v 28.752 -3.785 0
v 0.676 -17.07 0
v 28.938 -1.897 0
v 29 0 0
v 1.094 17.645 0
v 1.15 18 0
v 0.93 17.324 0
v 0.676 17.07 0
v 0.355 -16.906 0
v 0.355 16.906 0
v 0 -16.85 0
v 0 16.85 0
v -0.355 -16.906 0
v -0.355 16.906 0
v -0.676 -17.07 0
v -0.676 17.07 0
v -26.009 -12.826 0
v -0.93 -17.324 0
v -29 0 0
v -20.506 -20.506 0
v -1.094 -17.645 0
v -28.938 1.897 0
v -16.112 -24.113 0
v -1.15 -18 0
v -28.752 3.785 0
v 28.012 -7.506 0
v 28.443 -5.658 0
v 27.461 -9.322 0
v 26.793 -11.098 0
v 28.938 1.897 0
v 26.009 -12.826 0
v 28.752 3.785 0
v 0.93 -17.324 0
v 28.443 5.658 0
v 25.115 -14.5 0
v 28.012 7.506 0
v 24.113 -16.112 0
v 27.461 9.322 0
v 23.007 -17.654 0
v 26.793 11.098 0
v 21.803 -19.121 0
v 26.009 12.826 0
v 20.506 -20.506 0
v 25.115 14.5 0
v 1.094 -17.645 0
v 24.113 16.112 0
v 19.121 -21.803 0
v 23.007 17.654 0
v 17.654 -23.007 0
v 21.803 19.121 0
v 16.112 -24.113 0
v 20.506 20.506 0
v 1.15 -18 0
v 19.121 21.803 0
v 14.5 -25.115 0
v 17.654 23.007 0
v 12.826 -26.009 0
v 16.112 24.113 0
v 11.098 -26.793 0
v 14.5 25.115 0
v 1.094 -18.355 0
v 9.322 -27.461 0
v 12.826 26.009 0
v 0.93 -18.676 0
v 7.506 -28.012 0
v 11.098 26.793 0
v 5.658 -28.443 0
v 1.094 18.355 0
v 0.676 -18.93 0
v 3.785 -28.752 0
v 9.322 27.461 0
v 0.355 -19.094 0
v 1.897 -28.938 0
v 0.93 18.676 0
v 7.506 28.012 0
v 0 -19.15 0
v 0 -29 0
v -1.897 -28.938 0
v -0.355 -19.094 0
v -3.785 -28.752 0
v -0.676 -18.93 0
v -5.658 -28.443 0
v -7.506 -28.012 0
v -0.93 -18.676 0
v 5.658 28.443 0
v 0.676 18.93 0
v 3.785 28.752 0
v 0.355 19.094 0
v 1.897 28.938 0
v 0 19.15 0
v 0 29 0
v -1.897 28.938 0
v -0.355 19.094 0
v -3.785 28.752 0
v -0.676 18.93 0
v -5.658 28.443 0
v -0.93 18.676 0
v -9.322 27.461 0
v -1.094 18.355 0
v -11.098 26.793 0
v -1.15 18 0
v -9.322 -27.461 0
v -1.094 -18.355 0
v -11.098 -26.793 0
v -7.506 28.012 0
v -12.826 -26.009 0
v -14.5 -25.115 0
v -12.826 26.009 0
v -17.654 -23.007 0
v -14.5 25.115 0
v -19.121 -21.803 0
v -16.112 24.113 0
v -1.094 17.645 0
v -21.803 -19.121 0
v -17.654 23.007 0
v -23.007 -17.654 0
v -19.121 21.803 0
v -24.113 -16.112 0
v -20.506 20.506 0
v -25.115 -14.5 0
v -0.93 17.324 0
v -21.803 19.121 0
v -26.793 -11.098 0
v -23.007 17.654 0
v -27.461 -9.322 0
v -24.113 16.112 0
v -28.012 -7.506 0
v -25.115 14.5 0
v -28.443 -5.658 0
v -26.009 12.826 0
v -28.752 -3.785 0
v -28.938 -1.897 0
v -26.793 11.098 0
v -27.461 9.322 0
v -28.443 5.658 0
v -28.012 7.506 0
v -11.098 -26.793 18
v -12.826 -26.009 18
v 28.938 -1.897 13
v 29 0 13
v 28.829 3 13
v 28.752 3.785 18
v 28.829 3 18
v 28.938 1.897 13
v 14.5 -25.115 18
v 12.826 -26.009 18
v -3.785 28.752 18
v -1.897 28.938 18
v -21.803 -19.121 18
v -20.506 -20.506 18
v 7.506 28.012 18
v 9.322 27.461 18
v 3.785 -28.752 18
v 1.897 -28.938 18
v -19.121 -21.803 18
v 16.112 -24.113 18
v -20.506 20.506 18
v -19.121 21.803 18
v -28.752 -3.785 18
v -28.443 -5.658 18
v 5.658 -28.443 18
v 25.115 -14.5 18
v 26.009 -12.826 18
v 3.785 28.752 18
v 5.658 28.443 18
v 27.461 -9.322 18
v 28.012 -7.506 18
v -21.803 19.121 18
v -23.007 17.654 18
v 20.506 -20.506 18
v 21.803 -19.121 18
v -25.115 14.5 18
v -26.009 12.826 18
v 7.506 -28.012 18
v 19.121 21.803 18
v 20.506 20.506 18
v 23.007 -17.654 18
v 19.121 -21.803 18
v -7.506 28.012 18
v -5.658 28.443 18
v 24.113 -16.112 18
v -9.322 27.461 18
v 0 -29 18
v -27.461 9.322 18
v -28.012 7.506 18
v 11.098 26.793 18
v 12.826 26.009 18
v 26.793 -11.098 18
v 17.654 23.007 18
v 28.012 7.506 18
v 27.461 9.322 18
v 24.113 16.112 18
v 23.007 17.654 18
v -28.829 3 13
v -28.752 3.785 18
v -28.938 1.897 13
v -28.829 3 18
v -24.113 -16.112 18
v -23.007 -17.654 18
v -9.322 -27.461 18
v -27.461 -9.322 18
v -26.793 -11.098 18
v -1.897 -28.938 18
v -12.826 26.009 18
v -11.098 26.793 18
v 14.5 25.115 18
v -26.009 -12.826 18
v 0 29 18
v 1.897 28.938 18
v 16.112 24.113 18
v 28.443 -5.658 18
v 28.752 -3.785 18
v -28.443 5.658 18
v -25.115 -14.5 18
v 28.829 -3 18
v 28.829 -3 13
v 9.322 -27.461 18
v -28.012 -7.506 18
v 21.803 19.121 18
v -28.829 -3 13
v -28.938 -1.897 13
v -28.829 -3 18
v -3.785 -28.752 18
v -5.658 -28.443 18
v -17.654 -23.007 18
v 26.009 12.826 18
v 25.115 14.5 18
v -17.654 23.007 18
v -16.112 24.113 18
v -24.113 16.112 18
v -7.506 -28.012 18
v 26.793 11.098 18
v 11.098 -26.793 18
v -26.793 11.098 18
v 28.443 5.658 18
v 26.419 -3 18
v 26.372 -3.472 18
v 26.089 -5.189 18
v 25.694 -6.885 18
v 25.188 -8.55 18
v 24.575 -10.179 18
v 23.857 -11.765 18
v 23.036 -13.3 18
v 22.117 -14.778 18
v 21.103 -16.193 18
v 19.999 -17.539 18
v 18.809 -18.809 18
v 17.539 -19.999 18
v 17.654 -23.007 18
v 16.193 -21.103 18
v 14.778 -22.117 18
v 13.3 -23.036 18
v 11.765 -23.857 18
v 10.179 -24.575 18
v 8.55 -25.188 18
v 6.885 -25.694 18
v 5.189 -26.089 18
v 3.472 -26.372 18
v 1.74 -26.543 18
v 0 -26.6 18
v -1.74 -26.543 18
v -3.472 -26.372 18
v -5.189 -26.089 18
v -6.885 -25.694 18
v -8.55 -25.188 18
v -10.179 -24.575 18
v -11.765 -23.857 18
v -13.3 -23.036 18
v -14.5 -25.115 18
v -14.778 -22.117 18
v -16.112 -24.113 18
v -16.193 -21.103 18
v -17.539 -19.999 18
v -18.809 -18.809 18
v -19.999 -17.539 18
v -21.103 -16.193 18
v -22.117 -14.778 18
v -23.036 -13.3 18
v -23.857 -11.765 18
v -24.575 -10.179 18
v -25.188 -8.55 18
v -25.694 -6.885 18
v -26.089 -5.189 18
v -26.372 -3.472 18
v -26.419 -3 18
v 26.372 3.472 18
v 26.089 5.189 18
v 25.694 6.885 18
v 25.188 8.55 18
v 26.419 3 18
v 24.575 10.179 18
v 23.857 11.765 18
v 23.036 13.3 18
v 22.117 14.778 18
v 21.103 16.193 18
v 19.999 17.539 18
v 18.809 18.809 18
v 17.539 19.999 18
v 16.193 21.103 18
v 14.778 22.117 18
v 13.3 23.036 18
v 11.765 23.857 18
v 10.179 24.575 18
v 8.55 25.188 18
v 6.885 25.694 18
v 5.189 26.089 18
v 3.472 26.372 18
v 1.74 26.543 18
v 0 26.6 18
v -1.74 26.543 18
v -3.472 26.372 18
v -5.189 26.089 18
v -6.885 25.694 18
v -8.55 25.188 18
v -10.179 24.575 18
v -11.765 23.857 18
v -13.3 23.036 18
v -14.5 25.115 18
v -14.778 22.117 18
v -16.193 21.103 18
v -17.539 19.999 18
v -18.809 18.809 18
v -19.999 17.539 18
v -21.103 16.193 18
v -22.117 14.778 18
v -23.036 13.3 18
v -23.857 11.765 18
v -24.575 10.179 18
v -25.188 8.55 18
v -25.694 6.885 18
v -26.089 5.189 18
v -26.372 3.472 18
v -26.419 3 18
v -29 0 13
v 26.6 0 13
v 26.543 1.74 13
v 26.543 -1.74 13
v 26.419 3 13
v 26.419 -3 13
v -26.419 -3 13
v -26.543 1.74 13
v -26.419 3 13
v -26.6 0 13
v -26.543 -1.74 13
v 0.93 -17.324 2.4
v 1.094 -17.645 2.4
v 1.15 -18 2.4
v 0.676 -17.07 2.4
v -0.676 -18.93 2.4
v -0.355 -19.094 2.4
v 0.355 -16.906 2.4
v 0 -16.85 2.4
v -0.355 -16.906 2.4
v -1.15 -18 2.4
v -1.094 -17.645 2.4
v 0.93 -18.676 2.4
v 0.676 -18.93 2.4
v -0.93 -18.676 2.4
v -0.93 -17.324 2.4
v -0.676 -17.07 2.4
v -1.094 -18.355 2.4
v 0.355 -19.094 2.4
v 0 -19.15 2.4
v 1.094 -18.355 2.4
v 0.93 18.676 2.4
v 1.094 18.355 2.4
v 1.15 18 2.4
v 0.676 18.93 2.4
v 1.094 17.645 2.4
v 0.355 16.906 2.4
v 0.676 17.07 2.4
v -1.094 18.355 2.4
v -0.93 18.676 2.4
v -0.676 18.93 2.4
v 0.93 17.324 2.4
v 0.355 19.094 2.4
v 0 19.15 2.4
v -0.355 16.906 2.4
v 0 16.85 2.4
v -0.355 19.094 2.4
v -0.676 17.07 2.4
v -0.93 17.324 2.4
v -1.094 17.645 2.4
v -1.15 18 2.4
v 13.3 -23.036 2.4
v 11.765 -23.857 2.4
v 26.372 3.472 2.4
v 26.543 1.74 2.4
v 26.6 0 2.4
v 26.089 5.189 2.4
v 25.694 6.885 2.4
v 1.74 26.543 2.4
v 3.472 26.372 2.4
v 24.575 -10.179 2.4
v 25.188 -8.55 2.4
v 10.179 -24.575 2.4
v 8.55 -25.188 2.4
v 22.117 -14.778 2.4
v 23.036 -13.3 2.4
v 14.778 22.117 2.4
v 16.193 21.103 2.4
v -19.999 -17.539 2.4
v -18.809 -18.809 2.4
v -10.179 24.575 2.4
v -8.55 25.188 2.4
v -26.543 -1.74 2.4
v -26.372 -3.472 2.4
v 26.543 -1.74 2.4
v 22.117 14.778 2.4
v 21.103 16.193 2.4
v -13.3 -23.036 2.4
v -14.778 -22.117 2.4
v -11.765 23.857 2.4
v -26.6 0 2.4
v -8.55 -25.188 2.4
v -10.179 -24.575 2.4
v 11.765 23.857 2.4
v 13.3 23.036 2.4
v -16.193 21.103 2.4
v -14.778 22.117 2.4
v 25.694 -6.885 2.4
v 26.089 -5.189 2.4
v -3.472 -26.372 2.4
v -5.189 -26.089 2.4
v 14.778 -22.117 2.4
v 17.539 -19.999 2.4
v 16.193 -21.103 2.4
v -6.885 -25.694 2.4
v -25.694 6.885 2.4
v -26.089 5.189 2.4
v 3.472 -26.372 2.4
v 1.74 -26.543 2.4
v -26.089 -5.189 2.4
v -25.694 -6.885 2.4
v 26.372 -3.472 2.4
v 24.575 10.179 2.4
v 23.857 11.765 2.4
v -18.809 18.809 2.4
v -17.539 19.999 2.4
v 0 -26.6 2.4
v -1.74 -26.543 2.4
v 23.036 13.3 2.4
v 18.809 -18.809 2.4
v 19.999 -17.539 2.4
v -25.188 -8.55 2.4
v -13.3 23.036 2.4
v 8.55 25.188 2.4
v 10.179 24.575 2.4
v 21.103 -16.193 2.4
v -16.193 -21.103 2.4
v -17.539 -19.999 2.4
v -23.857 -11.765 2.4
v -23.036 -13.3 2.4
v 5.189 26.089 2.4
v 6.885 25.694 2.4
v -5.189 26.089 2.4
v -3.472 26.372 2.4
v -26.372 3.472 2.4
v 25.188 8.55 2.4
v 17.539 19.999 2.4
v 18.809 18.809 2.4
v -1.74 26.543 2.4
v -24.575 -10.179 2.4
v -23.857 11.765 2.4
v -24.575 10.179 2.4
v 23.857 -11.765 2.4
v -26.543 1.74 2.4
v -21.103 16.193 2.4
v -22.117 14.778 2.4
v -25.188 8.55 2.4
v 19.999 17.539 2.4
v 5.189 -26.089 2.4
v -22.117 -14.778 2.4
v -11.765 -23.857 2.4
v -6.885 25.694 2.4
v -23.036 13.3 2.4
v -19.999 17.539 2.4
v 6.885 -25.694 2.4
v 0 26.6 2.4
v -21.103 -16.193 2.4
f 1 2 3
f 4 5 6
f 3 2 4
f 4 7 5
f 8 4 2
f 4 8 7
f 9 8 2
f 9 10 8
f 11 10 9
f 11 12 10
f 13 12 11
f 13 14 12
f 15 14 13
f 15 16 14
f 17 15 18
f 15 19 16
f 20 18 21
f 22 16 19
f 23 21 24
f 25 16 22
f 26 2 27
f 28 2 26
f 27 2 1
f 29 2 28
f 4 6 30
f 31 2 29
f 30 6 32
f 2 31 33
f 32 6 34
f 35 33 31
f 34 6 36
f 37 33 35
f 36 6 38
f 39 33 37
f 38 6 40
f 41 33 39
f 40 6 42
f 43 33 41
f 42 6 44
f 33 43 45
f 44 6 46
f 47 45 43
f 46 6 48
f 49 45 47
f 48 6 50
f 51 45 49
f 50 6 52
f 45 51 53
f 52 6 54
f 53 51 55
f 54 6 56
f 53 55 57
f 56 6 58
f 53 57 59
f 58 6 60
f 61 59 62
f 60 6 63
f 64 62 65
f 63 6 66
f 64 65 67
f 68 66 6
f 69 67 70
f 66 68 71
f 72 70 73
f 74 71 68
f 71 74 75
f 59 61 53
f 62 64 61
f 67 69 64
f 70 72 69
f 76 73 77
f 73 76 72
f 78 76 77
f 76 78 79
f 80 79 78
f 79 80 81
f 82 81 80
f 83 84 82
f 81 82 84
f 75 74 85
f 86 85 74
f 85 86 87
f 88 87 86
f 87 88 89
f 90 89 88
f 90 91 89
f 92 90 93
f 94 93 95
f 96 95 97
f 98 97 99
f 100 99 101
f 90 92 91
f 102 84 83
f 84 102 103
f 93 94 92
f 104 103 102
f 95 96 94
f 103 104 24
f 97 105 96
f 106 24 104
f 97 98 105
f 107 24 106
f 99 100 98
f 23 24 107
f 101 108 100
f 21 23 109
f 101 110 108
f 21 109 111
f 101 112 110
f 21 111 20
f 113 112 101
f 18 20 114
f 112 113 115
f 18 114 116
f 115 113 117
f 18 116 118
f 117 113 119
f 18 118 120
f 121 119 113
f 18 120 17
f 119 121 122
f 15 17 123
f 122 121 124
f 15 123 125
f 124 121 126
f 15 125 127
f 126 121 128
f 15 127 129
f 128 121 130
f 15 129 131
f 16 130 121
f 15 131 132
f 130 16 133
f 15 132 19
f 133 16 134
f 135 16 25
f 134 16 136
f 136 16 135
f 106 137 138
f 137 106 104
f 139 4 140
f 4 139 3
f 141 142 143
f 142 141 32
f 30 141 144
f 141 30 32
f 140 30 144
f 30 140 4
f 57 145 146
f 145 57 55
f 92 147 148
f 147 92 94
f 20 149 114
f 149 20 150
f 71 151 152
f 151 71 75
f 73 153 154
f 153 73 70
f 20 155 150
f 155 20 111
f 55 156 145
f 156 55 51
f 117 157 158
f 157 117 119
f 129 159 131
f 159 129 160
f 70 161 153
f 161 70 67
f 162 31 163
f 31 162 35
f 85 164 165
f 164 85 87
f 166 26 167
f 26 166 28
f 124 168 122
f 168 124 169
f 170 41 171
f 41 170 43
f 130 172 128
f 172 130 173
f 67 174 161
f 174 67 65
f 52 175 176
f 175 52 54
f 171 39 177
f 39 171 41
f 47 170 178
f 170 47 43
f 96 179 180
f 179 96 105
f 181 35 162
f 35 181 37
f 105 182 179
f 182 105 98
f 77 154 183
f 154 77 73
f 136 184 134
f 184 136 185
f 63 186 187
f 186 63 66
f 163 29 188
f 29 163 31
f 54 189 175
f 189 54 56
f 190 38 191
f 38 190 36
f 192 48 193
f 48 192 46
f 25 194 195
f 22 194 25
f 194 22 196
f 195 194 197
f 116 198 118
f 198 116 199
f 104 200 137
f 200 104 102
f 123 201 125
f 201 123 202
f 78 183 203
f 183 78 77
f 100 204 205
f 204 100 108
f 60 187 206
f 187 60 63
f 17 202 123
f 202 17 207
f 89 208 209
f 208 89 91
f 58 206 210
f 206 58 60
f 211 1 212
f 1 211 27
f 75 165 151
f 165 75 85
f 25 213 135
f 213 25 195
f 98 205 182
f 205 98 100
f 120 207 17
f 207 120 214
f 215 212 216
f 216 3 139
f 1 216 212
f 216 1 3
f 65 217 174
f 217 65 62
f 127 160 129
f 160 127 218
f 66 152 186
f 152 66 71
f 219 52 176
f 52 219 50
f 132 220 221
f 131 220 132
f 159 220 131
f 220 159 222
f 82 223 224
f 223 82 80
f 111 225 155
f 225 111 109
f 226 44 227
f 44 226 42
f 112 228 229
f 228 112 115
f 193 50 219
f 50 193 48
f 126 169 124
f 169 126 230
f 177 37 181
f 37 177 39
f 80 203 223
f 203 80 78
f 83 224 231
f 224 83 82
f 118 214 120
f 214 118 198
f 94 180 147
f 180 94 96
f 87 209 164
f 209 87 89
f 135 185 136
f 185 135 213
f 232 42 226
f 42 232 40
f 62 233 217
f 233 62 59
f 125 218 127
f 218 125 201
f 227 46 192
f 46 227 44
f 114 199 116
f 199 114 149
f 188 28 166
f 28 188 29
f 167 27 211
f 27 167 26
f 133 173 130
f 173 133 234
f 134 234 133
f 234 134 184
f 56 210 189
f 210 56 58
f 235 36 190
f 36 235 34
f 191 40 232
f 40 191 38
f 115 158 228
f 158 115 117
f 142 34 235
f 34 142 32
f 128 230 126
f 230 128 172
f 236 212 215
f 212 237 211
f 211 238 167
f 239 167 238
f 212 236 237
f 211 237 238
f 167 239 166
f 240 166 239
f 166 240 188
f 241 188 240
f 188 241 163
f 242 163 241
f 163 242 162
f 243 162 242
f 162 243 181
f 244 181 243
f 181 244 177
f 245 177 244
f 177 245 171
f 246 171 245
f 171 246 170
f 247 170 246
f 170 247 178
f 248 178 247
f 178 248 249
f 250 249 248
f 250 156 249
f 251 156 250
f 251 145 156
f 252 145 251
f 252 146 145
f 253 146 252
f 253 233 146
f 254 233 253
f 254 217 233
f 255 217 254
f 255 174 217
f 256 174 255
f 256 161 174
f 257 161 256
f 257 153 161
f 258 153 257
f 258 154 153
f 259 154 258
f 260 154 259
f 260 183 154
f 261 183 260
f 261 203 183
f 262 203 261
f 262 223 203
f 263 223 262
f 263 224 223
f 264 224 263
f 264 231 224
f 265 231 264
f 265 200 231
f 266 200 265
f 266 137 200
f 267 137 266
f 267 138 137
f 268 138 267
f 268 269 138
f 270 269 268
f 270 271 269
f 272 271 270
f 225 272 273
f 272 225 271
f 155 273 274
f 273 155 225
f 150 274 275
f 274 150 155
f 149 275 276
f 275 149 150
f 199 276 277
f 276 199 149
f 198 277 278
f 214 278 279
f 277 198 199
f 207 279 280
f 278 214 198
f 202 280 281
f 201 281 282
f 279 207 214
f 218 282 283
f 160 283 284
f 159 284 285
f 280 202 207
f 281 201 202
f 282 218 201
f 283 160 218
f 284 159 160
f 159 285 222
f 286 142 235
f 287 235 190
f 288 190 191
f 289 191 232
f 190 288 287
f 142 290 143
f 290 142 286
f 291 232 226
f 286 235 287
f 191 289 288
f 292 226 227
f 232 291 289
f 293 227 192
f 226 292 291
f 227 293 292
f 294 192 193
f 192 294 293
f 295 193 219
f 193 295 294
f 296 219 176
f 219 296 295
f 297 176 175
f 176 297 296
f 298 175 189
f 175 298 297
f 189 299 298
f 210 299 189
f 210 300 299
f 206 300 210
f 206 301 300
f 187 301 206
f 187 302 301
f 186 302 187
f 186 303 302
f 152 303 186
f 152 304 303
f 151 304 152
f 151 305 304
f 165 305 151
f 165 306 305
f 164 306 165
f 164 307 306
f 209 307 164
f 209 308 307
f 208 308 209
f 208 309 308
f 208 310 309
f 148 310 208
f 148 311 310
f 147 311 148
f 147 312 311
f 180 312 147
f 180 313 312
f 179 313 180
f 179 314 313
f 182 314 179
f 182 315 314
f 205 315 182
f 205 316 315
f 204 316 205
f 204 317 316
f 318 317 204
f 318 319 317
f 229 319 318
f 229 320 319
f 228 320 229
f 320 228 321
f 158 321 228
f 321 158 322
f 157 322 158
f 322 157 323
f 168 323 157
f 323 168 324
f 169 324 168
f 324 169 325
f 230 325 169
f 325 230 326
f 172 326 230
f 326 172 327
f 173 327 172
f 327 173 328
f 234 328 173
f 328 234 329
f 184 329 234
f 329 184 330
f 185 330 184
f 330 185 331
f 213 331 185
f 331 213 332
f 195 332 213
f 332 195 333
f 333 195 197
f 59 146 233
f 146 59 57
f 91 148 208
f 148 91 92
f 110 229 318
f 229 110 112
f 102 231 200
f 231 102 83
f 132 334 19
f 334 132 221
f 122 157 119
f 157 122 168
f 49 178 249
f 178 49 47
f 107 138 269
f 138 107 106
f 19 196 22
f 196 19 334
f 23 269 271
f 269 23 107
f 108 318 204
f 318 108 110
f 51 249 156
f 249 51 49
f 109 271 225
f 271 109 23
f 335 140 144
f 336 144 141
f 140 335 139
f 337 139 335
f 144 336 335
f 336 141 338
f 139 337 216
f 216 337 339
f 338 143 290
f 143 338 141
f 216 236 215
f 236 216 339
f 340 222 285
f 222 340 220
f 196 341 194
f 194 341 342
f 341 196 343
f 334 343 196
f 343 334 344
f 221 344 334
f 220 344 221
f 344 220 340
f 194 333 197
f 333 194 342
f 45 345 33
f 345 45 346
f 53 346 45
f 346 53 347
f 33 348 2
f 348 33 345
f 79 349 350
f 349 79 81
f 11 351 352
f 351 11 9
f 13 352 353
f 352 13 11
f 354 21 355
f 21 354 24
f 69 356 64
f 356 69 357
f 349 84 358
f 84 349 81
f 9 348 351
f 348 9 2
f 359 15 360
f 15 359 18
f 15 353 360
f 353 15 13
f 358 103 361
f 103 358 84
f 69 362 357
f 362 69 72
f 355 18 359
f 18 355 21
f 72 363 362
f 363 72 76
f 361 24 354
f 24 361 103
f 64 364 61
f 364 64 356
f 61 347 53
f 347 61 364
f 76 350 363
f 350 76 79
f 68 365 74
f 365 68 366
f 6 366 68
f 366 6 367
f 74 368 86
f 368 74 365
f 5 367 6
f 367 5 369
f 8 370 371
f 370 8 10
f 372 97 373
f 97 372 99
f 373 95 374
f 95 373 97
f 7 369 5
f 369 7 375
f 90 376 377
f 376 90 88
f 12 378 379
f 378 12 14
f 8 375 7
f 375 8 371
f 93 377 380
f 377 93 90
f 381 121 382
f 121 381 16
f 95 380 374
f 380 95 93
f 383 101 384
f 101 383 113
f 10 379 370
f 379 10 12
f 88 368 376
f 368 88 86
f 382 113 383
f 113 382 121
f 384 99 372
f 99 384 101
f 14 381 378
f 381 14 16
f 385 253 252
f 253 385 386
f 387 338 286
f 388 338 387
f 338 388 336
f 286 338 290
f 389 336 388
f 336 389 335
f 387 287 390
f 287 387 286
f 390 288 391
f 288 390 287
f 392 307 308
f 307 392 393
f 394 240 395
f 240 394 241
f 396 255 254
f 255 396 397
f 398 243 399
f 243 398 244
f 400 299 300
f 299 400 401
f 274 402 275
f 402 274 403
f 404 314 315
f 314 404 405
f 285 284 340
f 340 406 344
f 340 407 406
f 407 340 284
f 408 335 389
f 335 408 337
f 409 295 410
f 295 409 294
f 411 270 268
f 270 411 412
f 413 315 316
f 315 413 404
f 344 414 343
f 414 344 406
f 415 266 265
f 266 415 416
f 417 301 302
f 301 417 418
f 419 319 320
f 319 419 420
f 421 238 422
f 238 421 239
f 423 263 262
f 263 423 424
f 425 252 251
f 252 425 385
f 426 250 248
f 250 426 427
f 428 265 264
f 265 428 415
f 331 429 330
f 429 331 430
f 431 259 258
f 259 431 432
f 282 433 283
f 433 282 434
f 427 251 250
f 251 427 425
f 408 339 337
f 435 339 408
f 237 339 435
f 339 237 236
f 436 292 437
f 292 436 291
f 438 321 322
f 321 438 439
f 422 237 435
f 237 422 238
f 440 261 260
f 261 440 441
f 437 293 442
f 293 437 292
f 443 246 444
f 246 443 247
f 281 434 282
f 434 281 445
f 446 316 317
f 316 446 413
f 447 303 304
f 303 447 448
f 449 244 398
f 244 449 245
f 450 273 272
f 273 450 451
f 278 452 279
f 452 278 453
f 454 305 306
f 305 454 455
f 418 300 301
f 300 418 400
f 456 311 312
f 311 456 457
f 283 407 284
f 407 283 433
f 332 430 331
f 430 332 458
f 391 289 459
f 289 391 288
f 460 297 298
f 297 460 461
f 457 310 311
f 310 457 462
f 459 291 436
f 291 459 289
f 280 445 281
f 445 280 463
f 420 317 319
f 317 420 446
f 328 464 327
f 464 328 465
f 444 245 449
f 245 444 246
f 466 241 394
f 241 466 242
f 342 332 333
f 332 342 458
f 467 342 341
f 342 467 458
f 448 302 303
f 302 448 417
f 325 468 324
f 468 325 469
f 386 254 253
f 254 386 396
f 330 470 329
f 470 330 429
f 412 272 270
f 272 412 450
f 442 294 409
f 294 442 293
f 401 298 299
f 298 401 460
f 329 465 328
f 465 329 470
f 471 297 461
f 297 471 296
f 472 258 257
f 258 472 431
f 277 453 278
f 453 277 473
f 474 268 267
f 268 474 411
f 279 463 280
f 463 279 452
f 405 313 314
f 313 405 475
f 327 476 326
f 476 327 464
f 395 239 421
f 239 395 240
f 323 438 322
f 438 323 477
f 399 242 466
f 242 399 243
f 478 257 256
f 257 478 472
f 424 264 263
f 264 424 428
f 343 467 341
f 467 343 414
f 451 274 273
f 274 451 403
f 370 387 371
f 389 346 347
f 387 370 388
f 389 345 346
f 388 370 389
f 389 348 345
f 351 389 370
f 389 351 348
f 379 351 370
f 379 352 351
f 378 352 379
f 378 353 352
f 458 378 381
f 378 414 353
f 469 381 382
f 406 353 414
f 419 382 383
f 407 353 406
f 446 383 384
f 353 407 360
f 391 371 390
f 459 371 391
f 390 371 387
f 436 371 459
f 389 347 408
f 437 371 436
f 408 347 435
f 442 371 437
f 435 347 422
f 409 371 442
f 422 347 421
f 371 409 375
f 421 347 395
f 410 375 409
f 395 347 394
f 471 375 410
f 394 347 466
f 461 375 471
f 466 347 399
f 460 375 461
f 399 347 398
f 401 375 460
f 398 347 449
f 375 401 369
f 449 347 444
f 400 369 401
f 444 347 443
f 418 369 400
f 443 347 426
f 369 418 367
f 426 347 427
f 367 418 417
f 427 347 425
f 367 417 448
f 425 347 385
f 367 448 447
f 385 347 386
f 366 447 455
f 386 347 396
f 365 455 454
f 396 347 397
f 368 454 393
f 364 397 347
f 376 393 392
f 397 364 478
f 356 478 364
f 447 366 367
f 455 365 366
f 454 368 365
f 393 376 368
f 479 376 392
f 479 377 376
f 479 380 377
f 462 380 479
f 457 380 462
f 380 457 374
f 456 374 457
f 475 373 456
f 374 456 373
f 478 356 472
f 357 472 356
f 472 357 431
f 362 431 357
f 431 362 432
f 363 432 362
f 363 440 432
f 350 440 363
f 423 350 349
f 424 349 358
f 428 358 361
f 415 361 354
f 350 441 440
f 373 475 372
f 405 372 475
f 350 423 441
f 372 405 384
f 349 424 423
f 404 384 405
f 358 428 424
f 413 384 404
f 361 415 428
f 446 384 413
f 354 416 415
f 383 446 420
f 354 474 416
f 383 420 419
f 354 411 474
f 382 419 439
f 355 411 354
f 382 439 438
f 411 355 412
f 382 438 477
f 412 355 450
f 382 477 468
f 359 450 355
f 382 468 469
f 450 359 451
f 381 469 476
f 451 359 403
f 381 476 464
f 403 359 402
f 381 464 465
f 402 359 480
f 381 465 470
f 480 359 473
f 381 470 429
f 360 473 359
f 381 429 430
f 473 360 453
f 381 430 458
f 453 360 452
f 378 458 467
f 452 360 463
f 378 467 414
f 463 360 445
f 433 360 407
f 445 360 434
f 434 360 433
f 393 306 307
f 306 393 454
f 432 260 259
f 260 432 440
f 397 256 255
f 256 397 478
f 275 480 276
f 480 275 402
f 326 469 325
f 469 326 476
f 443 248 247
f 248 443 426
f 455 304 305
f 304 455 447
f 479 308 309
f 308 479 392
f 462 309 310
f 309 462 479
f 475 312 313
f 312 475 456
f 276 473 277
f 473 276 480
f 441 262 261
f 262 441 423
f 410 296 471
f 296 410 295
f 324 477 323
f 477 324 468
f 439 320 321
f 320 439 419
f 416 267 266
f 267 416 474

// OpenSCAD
// file: ../../lib/arbi.scad
// Shared ARBI OpenSCAD helpers.
// Units: millimetres. License: AGPL-3.0-only.

ARBI_EPSILON = 0.02;
ARBI_DEFAULT_FACETS = 96;

module arbi_tube(
    outer_diameter,
    inner_diameter,
    height,
    center = false,
    facets = ARBI_DEFAULT_FACETS
) {
    assert(outer_diameter > inner_diameter, "Tube outer diameter must exceed inner diameter.");
    assert(inner_diameter >= 0, "Tube inner diameter cannot be negative.");
    assert(height > 0, "Tube height must be positive.");

    difference() {
        cylinder(d = outer_diameter, h = height, center = center, $fn = facets);
        translate([0, 0, center ? 0 : -ARBI_EPSILON])
            cylinder(
                d = inner_diameter,
                h = height + 2 * ARBI_EPSILON,
                center = center,
                $fn = facets
            );
    }
}

module arbi_rounded_box(
    size,
    radius,
    center = false,
    facets = ARBI_DEFAULT_FACETS
) {
    assert(len(size) == 3, "Rounded-box size must have three dimensions.");
    assert(min(size) > 0, "Rounded-box dimensions must be positive.");
    assert(radius > 0, "Rounded-box radius must be positive.");
    assert(2 * radius <= min(size[0], size[1]), "Rounded-box radius is too large.");

    offset = center ? [0, 0, 0] : [size[0] / 2, size[1] / 2, size[2] / 2];

    translate(offset)
        hull()
            for (x = [-size[0] / 2 + radius, size[0] / 2 - radius])
                for (y = [-size[1] / 2 + radius, size[1] / 2 - radius])
                    translate([x, y, 0])
                        cylinder(r = radius, h = size[2], center = true, $fn = facets);
}

module arbi_capsule_bar(
    length,
    width,
    height,
    center = true,
    facets = ARBI_DEFAULT_FACETS
) {
    assert(length >= width, "Capsule length must be at least its width.");
    assert(width > 0 && height > 0, "Capsule dimensions must be positive.");

    offset = center ? [0, 0, 0] : [length / 2, width / 2, height / 2];

    translate(offset)
        hull()
            for (x = [-(length - width) / 2, (length - width) / 2])
                translate([x, 0, 0])
                    cylinder(d = width, h = height, center = true, $fn = facets);
}

module arbi_bolt_circle(
    count,
    radius,
    hole_diameter,
    height,
    phase = 0,
    facets = ARBI_DEFAULT_FACETS
) {
    assert(count >= 1, "Bolt-circle count must be positive.");
    assert(radius > 0 && hole_diameter > 0 && height > 0, "Bolt-circle dimensions must be positive.");

    for (index = [0 : count - 1])
        rotate([0, 0, phase + index * 360 / count])
            translate([radius, 0, 0])
                cylinder(d = hole_diameter, h = height, center = true, $fn = facets);
}

// Product appearance only; colors do not specify material or validation status.
ARBI_SHELL = [0.94, 0.94, 0.92];
ARBI_CORE = [0.12, 0.14, 0.15];
ARBI_METAL = [0.66, 0.70, 0.73];
// main file
// ARBI camera-gimbal-rain-cap 0.1.0 — concept-unvalidated.
// Canonical source in millimetres. Splash path, drainage and servo clearance are unresolved.

include <../../lib/camera-pod.scad>

color(ARBI_SHELL)camera_gimbal_rain_cap();
